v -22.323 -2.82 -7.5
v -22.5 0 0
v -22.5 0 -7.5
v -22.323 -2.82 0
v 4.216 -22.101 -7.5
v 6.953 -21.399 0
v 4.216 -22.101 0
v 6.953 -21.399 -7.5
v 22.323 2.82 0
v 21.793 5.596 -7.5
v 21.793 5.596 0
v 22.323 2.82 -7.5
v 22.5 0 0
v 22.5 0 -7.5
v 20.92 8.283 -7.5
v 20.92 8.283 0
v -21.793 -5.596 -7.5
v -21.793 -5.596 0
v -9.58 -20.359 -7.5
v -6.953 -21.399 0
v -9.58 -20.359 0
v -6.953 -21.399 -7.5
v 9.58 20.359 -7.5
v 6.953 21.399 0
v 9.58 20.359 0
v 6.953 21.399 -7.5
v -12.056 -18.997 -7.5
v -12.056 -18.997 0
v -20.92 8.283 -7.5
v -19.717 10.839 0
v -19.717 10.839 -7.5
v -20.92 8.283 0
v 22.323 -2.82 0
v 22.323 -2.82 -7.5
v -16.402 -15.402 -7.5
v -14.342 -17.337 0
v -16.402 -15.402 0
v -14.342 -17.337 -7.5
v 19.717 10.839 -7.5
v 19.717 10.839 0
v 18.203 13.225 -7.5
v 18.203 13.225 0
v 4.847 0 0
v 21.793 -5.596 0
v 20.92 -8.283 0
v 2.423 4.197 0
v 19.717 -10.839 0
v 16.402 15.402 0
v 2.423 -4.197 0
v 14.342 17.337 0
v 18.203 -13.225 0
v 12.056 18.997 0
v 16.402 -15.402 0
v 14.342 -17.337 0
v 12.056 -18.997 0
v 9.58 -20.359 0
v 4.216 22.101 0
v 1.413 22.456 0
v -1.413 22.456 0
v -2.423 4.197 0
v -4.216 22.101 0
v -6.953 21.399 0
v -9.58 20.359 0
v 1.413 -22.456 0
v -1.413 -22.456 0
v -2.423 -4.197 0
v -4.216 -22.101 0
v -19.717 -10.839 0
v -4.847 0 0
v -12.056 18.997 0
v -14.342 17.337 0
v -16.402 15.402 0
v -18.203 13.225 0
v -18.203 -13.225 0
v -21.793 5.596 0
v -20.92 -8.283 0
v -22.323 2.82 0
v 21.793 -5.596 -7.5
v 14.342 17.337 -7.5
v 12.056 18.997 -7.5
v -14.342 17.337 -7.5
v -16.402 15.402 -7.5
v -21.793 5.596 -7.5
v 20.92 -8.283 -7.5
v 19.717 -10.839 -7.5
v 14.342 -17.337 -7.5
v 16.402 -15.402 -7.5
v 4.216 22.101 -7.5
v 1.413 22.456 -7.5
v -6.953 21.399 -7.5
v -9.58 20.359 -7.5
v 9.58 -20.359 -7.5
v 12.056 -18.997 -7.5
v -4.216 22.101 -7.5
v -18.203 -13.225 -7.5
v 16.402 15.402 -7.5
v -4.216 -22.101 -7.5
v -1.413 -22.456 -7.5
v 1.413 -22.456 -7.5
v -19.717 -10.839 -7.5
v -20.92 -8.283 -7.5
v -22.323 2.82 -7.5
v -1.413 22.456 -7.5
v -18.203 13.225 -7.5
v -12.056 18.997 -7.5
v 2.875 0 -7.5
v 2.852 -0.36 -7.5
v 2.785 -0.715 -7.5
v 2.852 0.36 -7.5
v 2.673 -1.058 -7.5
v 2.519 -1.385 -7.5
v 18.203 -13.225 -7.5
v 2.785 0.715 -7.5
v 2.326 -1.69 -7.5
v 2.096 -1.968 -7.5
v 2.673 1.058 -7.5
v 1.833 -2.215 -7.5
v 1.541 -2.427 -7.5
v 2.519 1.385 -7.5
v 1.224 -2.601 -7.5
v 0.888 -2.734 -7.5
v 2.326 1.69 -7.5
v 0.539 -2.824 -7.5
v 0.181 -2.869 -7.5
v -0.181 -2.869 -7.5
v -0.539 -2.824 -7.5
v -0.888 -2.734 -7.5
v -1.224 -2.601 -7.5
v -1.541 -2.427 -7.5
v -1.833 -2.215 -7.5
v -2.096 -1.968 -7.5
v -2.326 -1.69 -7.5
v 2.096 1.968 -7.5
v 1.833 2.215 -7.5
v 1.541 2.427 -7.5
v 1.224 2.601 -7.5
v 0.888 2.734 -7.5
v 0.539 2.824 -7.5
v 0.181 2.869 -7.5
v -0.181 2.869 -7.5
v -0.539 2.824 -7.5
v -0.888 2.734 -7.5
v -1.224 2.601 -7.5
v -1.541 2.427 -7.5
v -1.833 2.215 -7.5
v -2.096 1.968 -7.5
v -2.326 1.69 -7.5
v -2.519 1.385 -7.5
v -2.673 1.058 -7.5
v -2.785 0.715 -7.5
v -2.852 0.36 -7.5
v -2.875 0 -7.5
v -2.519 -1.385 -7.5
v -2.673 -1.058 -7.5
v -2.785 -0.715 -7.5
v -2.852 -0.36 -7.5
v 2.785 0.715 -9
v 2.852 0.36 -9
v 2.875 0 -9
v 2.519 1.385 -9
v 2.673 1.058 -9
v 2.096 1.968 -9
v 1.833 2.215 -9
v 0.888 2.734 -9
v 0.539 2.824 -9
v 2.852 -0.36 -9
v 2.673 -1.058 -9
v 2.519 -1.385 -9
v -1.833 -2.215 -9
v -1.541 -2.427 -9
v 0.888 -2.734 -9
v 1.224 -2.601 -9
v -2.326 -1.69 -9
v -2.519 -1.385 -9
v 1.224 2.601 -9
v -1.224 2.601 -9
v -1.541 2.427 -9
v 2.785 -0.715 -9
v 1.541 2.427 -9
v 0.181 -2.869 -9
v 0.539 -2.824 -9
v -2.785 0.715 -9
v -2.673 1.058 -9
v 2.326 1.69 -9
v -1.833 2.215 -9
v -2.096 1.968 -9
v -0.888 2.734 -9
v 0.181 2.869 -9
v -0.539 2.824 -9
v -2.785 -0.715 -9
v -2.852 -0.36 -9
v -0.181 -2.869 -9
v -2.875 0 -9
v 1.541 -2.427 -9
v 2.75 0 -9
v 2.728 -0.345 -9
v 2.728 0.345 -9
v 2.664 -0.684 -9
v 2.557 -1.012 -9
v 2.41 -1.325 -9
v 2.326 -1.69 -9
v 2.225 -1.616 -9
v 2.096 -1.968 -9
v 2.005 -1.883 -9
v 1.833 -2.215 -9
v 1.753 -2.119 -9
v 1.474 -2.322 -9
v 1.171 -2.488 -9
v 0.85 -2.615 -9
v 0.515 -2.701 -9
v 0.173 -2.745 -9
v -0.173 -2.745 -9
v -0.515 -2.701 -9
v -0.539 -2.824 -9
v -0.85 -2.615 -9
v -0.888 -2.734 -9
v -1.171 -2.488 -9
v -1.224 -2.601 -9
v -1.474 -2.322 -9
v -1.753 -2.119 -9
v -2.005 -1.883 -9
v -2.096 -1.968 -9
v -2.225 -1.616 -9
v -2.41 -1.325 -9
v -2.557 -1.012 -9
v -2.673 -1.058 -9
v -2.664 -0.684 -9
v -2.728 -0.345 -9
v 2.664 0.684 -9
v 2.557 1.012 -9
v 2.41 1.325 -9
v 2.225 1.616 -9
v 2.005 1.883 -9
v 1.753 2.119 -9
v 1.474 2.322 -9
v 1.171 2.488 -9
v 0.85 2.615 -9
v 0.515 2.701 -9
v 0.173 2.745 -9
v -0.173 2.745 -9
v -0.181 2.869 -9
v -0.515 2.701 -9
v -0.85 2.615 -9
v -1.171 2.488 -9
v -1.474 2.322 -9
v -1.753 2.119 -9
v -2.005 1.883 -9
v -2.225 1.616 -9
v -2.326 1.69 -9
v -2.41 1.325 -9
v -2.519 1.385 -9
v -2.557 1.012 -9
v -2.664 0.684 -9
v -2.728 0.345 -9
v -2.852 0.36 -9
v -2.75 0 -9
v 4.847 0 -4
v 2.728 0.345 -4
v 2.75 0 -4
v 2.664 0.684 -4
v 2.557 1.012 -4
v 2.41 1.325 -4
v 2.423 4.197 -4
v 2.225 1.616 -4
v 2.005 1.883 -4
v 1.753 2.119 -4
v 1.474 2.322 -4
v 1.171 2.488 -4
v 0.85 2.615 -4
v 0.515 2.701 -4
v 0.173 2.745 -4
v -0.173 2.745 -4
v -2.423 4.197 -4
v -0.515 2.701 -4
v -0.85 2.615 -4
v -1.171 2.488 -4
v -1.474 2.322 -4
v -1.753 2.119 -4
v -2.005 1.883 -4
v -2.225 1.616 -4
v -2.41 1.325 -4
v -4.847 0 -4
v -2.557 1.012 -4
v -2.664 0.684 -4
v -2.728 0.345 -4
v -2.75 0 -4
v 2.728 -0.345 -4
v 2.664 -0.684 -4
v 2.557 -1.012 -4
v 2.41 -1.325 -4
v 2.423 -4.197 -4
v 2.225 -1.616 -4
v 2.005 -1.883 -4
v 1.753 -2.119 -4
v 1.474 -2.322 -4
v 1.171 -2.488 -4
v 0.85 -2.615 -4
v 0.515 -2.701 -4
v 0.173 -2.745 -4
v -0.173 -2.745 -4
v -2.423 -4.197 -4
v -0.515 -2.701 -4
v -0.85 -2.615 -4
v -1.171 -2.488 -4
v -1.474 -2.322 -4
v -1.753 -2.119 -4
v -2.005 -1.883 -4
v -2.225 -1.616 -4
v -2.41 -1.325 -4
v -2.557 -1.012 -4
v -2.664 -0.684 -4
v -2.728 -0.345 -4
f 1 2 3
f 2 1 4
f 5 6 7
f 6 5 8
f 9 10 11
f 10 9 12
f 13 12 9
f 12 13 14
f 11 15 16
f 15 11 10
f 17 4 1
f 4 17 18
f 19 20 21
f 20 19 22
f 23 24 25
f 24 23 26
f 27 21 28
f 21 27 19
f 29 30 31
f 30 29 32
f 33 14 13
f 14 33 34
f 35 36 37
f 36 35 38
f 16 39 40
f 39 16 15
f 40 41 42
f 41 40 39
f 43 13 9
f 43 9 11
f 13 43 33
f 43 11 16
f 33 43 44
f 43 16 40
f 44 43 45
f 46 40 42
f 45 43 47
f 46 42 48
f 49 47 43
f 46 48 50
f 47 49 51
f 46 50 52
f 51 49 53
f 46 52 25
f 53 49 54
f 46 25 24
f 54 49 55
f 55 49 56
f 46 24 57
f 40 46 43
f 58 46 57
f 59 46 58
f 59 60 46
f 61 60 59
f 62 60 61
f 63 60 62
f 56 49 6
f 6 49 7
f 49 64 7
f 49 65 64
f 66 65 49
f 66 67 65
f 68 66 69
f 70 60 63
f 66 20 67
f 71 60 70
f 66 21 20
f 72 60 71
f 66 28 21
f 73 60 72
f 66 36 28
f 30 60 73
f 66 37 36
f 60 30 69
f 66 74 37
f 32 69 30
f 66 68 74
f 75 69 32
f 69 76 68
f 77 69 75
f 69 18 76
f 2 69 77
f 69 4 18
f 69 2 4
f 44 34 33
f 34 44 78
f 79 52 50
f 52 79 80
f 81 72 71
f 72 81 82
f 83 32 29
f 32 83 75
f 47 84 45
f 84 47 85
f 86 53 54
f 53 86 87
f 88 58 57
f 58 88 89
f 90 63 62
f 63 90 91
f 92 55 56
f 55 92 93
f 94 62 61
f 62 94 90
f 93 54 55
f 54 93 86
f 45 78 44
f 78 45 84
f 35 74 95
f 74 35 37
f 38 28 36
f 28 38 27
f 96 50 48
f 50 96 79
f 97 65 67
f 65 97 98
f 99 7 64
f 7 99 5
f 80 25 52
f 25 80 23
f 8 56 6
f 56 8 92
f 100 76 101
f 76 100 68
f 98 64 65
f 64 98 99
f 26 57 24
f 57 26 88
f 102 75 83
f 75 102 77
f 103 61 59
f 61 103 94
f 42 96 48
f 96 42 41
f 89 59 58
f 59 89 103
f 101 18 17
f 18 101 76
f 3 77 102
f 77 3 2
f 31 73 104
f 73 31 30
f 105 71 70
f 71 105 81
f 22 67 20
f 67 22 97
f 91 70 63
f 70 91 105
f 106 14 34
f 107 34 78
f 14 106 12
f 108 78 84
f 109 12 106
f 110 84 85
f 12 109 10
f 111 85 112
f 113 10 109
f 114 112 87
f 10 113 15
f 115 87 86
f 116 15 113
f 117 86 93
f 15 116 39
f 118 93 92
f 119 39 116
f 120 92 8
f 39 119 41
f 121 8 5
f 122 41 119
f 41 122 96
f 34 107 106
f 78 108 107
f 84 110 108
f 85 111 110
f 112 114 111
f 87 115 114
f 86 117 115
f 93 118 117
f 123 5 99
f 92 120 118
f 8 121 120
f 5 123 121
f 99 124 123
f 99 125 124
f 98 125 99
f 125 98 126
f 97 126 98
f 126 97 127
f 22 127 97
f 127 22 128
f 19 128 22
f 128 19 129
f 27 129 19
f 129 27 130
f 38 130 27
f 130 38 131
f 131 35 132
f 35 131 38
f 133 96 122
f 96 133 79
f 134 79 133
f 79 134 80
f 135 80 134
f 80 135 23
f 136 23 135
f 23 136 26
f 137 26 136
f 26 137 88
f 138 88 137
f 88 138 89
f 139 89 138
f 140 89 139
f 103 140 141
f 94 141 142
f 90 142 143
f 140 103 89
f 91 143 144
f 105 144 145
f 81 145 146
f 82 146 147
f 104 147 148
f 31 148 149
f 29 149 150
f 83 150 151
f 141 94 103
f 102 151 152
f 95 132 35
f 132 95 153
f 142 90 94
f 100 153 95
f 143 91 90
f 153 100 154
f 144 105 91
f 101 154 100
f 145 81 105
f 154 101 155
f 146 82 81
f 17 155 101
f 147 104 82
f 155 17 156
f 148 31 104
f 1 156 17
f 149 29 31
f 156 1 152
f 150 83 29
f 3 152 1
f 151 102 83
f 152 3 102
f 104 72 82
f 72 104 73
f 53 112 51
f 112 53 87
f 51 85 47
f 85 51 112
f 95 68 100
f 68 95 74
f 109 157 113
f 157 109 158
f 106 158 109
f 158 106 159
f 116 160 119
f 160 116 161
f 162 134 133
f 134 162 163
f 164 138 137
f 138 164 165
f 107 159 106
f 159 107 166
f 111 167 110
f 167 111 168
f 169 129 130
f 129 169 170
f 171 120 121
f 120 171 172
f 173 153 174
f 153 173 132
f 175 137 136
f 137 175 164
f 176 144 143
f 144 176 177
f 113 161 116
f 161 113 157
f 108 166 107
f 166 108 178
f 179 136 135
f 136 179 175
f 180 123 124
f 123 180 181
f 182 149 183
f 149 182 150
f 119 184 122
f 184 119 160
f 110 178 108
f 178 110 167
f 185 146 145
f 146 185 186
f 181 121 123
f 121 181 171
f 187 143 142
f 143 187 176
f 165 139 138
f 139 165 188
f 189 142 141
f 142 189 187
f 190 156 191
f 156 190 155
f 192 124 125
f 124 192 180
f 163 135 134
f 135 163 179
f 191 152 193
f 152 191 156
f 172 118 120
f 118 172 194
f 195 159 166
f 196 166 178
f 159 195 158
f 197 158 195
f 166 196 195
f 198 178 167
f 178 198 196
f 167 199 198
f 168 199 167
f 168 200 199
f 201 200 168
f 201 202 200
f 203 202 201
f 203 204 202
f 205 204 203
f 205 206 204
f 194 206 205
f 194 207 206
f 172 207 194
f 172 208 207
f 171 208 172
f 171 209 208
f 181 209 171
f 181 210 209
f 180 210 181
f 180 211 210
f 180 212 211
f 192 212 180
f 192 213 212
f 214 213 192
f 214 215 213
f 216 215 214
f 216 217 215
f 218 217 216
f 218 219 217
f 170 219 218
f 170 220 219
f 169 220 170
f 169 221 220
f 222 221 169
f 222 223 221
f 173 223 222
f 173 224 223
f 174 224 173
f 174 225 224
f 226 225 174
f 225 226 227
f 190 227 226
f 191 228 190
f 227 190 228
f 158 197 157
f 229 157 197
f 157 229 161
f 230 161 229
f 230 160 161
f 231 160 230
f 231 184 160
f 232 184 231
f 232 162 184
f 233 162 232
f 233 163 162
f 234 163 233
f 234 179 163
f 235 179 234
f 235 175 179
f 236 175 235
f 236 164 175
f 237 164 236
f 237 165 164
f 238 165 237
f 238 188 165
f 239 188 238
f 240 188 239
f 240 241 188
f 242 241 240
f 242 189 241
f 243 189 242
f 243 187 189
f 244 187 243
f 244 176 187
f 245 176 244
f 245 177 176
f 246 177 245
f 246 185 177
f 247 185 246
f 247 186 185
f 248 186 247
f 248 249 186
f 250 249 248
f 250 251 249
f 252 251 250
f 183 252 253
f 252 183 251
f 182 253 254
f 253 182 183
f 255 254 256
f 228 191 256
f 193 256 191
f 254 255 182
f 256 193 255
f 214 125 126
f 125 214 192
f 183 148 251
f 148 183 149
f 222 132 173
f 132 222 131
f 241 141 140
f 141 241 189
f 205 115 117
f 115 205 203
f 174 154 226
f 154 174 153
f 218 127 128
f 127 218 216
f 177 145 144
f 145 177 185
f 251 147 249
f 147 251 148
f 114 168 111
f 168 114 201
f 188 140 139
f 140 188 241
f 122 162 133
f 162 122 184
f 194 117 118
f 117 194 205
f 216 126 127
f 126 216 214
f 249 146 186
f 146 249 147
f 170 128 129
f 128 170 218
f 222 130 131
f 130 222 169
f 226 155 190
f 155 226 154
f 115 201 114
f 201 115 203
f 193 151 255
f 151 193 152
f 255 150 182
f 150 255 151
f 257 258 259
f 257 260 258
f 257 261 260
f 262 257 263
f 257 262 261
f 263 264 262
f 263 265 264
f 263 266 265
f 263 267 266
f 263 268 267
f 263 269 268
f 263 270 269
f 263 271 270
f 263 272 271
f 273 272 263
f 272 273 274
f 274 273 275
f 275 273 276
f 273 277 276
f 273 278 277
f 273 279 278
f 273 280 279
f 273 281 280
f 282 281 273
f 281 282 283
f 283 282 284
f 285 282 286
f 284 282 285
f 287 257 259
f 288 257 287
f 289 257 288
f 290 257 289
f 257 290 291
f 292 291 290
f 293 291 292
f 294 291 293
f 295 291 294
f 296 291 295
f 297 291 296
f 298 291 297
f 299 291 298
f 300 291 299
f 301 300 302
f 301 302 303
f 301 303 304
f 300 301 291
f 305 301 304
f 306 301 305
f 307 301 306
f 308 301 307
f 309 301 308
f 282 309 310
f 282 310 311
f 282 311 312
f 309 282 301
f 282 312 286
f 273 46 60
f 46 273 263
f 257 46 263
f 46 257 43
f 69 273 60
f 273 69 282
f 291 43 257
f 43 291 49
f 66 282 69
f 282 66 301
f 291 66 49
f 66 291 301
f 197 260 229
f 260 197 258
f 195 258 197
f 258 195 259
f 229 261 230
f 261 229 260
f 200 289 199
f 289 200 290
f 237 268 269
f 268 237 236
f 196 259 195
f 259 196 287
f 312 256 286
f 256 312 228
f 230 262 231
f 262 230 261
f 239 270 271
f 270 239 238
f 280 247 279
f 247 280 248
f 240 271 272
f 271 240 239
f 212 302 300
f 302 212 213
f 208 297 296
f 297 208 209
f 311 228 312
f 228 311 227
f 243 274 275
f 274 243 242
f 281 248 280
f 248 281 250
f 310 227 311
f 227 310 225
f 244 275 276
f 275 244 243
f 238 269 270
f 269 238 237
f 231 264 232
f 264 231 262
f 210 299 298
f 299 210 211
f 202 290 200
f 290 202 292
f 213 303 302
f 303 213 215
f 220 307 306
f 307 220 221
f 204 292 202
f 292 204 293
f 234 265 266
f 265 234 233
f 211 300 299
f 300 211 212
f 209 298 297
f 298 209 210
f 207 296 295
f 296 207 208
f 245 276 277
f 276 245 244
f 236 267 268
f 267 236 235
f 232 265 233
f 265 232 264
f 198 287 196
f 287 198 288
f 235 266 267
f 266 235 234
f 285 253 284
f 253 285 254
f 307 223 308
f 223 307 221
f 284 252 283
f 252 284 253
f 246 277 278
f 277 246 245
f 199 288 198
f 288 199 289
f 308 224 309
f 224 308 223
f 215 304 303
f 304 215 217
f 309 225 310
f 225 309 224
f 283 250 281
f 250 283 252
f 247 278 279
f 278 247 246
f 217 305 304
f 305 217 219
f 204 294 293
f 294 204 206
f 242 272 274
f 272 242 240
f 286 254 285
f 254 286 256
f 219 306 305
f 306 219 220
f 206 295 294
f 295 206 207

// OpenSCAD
$fn = 50;

difference() {
	union() {
		translate(v = [0, 0, -7.5]) {
			cylinder(h = 7.5, r = 22.5);
		}
		#translate(v = [0, 0, -9.0]) {
			cylinder(h = 9, r = 2.875);
		}
	}
	union() {
		translate(v = [0, 0, 0]) {
			rotate(a = [0, 0, 0]) {
				difference() {
					union() {
						translate(v = [0, 0, -4]) {
							linear_extrude(height = 4) {
								polygon(points = [[4.8468, 0.0], [2.4234000000000004, 4.197451927062417], [-2.423399999999999, 4.197451927062417], [-4.8468, 5.935618106107392e-16], [-2.423400000000002, -4.197451927062416], [2.423399999999997, -4.197451927062419]]);
							}
						}
					}
					union();
				}
			}
		}
		#translate(v = [0, 0, -100.0]) {
			cylinder(h = 200, r = 2.75);
		}
	}
}
